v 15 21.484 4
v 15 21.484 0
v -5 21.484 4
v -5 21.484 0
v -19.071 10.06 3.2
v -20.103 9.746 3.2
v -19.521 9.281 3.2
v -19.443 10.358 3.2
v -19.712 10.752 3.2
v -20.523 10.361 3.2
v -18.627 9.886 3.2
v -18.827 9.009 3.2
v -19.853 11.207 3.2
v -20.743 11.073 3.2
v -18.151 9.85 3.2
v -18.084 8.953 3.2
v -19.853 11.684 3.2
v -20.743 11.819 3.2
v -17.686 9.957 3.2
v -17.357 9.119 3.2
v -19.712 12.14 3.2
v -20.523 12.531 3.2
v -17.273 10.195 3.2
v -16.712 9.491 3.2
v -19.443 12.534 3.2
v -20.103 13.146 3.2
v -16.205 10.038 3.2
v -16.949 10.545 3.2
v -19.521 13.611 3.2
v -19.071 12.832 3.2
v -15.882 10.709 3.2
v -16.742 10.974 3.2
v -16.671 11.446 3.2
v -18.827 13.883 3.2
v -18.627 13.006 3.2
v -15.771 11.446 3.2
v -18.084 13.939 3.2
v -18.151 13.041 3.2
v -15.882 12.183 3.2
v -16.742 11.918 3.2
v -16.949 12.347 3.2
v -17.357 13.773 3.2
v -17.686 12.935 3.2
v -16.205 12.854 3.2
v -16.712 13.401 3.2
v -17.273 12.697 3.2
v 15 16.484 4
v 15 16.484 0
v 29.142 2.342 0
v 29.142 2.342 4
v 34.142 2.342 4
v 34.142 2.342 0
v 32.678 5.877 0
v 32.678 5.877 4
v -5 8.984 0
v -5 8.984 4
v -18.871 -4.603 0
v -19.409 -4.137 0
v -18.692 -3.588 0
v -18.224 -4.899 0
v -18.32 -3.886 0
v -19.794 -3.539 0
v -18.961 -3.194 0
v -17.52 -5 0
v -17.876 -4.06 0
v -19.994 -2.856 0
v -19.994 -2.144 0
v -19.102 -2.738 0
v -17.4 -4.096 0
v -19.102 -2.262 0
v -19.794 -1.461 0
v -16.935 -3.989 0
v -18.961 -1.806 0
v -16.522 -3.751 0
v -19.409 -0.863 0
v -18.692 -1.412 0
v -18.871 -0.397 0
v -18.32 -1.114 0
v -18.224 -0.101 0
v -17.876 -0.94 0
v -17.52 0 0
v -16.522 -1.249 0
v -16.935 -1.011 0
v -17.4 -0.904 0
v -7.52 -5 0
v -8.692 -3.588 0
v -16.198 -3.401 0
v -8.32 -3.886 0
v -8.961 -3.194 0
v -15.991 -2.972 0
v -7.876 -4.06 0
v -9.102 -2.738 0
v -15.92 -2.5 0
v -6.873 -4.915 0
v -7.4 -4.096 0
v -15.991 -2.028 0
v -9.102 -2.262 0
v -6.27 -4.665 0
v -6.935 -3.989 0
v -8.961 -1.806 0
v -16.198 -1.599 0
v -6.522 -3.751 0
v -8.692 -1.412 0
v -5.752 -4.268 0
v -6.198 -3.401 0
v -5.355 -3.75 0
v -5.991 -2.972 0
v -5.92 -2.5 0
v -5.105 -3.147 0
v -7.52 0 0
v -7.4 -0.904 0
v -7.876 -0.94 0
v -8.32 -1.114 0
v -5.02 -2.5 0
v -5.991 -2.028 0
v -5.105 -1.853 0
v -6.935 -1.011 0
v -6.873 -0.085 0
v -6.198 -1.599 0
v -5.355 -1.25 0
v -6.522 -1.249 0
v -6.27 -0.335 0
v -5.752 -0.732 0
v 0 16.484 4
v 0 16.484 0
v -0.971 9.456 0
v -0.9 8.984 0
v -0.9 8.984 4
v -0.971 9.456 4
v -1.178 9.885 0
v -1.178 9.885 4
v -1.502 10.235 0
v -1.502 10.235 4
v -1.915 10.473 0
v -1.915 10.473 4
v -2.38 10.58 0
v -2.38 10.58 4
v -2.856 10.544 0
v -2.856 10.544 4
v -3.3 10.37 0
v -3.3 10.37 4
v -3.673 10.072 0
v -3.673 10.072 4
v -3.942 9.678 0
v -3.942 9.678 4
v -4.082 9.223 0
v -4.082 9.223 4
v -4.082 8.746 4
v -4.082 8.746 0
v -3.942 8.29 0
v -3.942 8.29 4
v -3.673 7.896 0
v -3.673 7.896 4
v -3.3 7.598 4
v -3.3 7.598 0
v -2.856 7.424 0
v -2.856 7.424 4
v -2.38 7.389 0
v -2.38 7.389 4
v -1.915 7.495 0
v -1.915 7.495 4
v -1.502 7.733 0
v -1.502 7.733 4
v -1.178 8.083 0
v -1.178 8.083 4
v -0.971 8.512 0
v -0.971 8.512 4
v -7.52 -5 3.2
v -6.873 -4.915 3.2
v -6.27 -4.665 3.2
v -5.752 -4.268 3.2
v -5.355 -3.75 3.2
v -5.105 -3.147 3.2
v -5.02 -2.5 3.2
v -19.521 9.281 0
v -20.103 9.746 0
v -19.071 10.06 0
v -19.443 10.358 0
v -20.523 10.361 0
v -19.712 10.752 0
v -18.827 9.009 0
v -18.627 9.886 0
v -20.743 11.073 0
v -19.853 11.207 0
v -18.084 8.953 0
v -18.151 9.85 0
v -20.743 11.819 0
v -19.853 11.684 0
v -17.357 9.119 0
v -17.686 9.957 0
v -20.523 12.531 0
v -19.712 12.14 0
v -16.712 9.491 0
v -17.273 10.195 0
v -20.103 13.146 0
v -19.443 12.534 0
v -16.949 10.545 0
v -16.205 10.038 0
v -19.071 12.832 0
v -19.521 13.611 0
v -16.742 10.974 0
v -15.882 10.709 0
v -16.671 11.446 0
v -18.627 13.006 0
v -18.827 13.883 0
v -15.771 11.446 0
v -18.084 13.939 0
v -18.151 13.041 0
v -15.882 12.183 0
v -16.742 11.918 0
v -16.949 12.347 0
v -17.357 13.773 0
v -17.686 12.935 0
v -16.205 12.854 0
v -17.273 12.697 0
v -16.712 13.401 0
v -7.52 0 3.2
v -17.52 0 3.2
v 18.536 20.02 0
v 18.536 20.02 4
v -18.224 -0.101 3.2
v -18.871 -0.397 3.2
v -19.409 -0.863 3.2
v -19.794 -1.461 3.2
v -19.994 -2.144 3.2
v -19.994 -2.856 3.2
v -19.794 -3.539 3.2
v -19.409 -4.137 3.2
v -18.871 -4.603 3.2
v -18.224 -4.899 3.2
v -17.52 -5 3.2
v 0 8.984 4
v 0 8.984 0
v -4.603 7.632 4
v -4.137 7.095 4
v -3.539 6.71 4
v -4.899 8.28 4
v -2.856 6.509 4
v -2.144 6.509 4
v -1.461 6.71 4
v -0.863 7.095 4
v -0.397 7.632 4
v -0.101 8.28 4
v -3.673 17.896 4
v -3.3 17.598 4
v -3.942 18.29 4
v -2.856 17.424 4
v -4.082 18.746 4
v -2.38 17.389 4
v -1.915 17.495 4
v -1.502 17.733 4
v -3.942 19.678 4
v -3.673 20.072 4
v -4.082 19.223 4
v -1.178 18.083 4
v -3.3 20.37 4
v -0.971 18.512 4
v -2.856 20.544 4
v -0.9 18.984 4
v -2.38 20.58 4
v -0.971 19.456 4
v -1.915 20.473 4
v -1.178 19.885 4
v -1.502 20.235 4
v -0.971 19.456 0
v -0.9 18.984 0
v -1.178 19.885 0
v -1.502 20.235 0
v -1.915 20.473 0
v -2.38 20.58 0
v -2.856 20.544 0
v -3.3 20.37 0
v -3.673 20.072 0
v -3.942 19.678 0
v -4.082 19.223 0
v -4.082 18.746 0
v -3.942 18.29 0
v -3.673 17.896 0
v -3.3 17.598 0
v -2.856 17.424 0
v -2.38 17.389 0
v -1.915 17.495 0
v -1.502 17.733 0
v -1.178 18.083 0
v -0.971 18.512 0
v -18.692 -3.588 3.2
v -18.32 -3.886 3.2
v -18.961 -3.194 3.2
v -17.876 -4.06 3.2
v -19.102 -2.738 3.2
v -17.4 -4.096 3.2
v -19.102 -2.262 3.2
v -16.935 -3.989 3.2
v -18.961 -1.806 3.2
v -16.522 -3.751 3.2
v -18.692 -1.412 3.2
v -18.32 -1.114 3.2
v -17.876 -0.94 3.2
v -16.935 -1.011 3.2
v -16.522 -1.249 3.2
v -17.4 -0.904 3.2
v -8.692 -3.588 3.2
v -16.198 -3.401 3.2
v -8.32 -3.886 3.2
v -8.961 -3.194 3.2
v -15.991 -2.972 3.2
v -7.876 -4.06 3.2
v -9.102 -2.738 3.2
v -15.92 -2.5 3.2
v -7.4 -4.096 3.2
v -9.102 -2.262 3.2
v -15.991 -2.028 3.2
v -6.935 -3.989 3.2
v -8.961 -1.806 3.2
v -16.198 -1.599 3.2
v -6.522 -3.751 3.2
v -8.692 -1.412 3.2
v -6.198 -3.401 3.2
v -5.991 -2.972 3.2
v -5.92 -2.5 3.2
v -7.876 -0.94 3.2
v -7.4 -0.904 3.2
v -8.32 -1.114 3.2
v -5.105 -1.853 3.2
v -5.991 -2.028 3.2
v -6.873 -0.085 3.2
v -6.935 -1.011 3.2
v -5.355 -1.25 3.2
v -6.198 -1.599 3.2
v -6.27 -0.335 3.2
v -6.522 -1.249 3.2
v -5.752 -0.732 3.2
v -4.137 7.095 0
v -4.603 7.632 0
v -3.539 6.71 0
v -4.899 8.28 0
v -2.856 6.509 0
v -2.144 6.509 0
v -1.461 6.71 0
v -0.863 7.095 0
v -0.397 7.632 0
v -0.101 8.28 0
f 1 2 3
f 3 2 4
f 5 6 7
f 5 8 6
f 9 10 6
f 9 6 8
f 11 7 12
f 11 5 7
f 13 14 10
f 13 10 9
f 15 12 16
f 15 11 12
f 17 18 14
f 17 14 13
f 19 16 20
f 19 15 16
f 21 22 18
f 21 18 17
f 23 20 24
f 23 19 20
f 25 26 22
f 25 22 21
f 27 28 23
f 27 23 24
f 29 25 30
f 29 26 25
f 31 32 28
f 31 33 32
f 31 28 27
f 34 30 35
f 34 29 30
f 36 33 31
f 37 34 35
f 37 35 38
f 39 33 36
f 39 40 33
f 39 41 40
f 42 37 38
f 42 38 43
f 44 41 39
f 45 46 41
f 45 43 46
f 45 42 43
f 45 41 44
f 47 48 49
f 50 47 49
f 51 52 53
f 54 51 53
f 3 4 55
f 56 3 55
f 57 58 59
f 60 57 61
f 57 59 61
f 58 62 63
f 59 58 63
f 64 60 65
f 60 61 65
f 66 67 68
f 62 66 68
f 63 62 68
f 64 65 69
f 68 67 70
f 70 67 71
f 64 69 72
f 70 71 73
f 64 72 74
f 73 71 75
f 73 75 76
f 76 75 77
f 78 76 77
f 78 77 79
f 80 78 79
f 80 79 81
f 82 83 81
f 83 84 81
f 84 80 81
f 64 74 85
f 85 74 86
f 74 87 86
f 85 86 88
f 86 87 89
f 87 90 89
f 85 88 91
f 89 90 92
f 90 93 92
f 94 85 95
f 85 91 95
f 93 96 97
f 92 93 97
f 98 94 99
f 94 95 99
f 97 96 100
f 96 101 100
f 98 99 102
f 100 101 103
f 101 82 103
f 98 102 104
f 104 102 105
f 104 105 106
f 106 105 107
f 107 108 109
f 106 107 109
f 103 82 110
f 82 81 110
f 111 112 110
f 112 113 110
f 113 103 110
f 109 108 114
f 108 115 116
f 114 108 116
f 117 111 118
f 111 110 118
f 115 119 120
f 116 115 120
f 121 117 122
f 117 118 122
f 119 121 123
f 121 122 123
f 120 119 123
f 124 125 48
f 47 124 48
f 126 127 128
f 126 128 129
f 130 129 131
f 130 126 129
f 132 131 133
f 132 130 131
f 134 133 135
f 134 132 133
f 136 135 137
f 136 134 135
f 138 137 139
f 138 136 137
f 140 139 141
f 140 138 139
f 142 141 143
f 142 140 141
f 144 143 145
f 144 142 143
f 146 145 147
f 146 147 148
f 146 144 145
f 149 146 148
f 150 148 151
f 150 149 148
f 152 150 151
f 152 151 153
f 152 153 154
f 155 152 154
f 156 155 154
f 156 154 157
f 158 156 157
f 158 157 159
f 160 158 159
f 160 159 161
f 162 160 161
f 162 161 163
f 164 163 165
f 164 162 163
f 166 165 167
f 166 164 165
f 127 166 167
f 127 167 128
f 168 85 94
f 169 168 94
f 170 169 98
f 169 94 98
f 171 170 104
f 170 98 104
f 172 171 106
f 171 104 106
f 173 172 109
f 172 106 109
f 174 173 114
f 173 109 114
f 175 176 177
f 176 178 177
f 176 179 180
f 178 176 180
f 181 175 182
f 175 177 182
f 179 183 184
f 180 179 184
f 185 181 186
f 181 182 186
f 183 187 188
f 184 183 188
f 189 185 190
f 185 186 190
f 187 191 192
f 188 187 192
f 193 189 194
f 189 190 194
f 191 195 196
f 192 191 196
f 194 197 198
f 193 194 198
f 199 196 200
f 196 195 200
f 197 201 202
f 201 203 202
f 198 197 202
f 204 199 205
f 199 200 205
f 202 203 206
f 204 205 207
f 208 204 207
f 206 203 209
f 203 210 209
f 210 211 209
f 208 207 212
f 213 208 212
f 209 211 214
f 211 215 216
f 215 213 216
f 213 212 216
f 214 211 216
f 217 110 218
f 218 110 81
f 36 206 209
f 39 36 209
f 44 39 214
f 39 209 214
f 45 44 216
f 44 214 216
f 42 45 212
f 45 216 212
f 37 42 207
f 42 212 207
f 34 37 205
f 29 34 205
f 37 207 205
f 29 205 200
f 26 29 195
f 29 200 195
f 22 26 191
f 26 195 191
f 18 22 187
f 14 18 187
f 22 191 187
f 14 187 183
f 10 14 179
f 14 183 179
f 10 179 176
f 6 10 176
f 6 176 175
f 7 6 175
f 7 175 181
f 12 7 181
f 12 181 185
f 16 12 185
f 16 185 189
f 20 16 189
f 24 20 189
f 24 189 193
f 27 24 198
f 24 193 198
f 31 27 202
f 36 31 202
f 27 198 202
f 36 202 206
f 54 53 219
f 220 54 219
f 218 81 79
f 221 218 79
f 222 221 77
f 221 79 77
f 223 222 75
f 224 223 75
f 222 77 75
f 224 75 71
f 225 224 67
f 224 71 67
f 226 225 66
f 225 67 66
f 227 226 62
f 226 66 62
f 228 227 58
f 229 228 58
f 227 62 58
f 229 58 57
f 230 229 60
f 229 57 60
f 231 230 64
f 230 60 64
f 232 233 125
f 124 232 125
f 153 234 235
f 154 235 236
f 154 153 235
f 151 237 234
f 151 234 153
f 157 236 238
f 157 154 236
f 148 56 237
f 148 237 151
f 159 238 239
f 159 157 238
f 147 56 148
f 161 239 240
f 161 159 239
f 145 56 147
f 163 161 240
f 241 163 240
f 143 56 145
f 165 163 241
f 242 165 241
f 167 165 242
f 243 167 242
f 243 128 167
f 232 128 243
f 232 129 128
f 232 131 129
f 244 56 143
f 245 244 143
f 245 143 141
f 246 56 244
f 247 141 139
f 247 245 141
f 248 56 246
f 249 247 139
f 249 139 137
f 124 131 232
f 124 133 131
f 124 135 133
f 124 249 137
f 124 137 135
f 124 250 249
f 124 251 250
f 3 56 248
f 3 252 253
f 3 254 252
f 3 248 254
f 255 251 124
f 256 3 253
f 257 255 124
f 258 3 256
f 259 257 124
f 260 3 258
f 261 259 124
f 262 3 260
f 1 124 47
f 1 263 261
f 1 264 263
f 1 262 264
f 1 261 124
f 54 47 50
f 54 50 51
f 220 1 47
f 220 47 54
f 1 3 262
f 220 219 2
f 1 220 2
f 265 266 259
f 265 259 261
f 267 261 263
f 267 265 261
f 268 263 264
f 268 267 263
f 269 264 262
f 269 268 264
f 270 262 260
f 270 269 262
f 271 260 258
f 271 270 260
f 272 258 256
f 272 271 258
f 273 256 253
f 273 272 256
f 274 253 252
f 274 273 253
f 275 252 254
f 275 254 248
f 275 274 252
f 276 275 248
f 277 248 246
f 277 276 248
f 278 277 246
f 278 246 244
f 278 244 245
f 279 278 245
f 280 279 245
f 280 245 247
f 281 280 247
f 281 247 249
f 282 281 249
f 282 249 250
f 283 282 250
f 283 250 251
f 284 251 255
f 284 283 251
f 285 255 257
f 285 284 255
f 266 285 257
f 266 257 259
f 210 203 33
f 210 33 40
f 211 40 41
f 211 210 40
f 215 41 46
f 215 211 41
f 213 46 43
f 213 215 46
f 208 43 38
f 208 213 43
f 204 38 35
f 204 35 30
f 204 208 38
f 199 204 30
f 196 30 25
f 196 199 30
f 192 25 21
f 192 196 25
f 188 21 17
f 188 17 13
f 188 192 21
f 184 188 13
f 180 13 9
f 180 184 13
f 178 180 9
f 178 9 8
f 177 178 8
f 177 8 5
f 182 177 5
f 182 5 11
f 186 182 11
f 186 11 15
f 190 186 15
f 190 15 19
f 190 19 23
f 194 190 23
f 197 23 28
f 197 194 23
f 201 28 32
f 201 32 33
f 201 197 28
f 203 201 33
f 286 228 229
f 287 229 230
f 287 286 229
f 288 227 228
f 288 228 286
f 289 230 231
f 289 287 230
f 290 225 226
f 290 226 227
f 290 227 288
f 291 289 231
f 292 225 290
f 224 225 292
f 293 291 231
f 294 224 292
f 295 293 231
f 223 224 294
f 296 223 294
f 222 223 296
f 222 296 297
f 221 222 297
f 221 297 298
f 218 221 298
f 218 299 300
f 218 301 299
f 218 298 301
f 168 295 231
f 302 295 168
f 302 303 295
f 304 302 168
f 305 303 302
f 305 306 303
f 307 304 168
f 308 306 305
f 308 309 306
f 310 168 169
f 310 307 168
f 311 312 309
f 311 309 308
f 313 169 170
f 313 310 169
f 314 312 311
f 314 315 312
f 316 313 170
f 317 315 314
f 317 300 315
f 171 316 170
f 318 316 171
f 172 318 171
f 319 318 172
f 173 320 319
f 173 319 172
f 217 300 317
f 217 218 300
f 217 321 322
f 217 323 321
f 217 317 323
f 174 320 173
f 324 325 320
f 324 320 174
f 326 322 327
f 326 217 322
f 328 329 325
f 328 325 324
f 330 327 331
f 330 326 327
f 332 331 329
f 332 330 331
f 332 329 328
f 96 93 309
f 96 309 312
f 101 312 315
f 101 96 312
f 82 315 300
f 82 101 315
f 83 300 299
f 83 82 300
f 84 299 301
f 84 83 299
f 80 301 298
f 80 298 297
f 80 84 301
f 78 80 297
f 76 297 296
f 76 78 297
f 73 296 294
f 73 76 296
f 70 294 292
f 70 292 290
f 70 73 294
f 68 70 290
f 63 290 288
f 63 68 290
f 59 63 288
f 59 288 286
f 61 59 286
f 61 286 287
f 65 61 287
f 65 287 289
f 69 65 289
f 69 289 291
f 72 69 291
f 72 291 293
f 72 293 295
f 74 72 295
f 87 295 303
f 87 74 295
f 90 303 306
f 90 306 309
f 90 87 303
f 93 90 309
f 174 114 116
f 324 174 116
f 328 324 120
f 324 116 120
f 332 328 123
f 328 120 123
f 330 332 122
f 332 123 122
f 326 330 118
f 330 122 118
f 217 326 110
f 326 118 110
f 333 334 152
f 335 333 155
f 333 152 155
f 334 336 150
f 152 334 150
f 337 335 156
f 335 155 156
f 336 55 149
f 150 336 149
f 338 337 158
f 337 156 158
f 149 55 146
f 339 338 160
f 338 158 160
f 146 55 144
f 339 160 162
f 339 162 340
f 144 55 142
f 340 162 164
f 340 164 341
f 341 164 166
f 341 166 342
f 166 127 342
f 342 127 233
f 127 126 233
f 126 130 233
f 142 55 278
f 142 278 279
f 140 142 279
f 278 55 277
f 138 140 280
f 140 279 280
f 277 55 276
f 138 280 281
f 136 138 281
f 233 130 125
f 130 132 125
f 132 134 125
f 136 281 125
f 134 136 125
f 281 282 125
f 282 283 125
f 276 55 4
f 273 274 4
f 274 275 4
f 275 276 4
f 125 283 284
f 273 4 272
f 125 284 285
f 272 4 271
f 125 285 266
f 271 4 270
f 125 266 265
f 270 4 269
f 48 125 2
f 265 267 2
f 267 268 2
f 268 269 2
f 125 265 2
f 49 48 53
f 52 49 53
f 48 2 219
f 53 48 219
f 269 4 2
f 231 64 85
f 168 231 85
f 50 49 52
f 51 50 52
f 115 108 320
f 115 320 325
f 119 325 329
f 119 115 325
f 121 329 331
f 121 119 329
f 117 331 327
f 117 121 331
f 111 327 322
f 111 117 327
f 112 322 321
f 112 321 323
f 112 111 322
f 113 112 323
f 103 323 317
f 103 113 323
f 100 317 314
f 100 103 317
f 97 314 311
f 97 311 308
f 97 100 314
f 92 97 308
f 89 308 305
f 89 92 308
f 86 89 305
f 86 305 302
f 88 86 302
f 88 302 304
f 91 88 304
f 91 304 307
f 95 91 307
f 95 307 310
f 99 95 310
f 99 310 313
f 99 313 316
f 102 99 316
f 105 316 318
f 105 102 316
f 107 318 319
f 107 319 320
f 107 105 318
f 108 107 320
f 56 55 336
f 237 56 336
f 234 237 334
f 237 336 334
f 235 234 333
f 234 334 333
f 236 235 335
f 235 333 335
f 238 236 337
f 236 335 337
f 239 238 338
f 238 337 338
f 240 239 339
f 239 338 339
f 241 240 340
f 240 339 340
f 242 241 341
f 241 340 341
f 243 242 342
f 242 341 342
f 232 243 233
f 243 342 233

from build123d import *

# Parameters (mm, degrees)
F0_R     = 1.6
F1_DEPTH = 4
F2_DEPTH = 3.2
F0_R_2   = 2.5
F3_DEPTH = 3.2


with BuildPart() as f1:
    # F0 (on Top) → F1 (new body)
    with BuildSketch(Plane.XY):
        with BuildLine():
            Line((0, 8.984046), (0, 16.484046))
            Line((0, 16.484046), (15, 16.484046))
            Line((15, 16.484046), (29.142136, 2.34191))
            Line((29.142136, 2.34191), (34.142136, 2.34191))
            Line((34.142136, 2.34191), (32.67767, 5.877444))
            Line((32.67767, 5.877444), (18.535534, 20.01958))
            Line((18.535534, 20.01958), (15, 21.484046))
            Line((15, 21.484046), (0, 21.484046))
            Line((0, 21.484046), (-5, 21.484046))
            Line((-5, 21.484046), (-5, 16.484046))
            Line((-5, 16.484046), (-5, 8.984046))
            ThreePointArc((-5, 8.984046), (-2.5, 11.484046), (0, 8.984046))
        make_face()
        with Locations((-2.5, 18.984046)):
            Circle(F0_R, mode=Mode.SUBTRACT)
        with BuildLine():
            ThreePointArc((-5, 8.984046), (-2.5, 6.484046), (0, 8.984046))
            ThreePointArc((0, 8.984046), (-2.5, 11.484046), (-5, 8.984046))
        make_face()
        with Locations((-2.5, 8.984046)):
            Circle(F0_R, mode=Mode.SUBTRACT)
    extrude(amount=F1_DEPTH)


with BuildPart() as f2:
    # F0 (on Top) → F2 (new body)
    with BuildSketch(Plane.XY):
        with BuildLine():
            ThreePointArc((-7.51958, -5), (-5.751813, -4.267767), (-5.01958, -2.5))
            ThreePointArc((-5.01958, -2.5), (-5.751813, -0.732233), (-7.51958, 0))
            ThreePointArc((-7.51958, 0), (-10.01958, -2.5), (-7.51958, -5))
        make_face()
        with Locations((-7.51958, -2.5)):
            Circle(F0_R, mode=Mode.SUBTRACT)
        with BuildLine():
            ThreePointArc((-7.51958, -5), (-10.01958, -2.5), (-7.51958, 0))
            Line((-7.51958, 0), (-17.51958, 0))
            ThreePointArc((-17.51958, 0), (-15.751813, -0.732233), (-15.01958, -2.5))
            ThreePointArc((-15.01958, -2.5), (-15.751813, -4.267767), (-17.51958, -5))
            Line((-17.51958, -5), (-7.51958, -5))
        make_face()
        with BuildLine():
            ThreePointArc((-15.01958, -2.5), (-15.751813, -0.732233), (-17.51958, 0))
            ThreePointArc((-17.51958, 0), (-20.01958, -2.5), (-17.51958, -5))
            ThreePointArc((-17.51958, -5), (-15.751813, -4.267767), (-15.01958, -2.5))
        make_face()
        with Locations((-17.51958, -2.5)):
            Circle(F0_R, mode=Mode.SUBTRACT)
    extrude(amount=F2_DEPTH)


with BuildPart() as f3:
    # F0 (on Top) → F3 (new body)
    with BuildSketch(Plane.XY):
        with Locations((-18.270541, 11.445943)):
            Circle(F0_R_2)
        with Locations((-18.270541, 11.445943)):
            Circle(F0_R, mode=Mode.SUBTRACT)
    extrude(amount=F3_DEPTH)


solid = Compound([f1.part, f2.part, f3.part])
